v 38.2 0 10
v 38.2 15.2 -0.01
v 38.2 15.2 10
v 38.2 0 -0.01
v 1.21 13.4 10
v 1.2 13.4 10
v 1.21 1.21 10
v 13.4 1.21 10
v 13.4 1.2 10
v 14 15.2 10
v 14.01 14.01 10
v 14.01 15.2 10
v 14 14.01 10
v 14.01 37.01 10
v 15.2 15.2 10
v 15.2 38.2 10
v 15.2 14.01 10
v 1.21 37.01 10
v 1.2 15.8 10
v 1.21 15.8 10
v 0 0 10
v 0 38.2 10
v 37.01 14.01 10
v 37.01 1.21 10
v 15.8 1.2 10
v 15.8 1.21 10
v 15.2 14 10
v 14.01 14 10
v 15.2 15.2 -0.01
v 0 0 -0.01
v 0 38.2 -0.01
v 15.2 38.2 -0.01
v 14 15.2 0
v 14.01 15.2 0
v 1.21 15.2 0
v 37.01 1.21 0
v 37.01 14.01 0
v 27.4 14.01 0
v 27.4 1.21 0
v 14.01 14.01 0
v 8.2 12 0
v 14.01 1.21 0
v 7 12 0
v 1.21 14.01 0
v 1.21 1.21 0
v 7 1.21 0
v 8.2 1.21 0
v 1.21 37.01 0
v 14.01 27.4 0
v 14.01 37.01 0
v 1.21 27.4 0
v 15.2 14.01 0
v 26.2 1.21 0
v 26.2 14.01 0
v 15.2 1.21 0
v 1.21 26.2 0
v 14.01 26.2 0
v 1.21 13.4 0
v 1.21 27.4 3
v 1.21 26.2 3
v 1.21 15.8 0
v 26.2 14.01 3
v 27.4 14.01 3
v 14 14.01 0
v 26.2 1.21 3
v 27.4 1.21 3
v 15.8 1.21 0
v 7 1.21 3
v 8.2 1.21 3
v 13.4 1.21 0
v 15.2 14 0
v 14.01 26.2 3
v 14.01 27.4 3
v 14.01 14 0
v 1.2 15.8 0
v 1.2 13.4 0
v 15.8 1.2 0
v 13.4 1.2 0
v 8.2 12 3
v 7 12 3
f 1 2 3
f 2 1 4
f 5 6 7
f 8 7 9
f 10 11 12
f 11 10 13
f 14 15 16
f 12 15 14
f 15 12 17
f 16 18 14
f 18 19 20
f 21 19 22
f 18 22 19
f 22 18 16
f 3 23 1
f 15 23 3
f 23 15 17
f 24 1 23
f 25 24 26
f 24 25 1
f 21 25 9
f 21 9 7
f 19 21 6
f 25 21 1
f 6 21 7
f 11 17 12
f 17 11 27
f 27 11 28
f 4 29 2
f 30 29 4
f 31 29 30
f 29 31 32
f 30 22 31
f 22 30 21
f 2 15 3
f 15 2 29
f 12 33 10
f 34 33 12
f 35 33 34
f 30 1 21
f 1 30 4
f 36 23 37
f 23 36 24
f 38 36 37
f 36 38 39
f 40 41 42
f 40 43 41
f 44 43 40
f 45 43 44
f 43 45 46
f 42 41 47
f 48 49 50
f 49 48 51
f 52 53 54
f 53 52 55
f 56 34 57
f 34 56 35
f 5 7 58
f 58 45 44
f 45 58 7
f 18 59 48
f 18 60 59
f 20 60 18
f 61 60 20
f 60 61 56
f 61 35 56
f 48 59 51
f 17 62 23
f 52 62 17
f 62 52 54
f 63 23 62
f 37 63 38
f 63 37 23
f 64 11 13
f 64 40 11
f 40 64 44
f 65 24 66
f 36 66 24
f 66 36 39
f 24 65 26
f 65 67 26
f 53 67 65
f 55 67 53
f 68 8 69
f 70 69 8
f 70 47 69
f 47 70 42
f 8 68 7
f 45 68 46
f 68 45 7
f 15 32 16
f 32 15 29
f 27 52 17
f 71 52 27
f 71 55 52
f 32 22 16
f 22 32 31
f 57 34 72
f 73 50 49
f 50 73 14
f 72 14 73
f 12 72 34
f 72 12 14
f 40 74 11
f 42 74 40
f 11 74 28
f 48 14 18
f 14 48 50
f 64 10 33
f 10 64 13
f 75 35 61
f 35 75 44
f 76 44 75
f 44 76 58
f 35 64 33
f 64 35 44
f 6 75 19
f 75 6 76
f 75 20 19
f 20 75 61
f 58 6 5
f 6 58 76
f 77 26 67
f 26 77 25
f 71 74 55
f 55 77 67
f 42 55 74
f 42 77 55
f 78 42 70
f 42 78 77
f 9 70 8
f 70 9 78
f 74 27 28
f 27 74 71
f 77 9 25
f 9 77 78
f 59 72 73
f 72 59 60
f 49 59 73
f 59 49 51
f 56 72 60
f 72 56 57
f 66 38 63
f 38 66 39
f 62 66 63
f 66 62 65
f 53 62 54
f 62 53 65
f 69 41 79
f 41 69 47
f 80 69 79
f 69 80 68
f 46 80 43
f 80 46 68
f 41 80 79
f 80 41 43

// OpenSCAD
// file: ../Base/PlacementOptions.scad
// Fischertechnik Box Foundation
// Placement Options

// Alignment
NoAlign = 0;
AlignLeft = 1;
AlignBottom = 2;
AlignCenter = 3;
AlignRight = 4;
AlignTop = 5;

// Element rotation degree steps
rotations = [0, -90, -180, -270];

// Rotation
NoRotation = 0;
Rotate0 = 0;
Rotate90 = 1;
Rotate180 = 2;
Rotate270 = 3;

// Docking (seen from above)
NoDock = -1;
DockLeft = 0;
DockTop = 1;
DockRight = 2;
DockCorner = 2;
DockBottom = 3;

// Web corners
LowerLeft = 0;
UpperLeft = 1;
UpperRight = 2;
LowerRight = 3;

// Web position relative to corner
LeftOfCorner = 0;
RightOfCorner = 1;
// file: ../Base/Boxes.scad
// Fischertechnik Box Foundation
// Pre-designed Boxes

use <Constants.scad>

include <PlacementOptions.scad>

box190Width = 190;
box190Depth = 130;
box130Width = 130;
box130Depth = 95;

// Values are from an original ec3 box
topBottomDifference = 1.5;
outerHeight = 40;
baseThickness = 1.8;
innerHeight = outerHeight - baseThickness;
stackExcess = 5.7;
radius = 3.5;
wallThickness = 1.5;
tolerance = 0.2;

boxWallThickness = wallThickness;
boxBaseThickness = baseThickness;
boxWebWidth = 3.0;

// getBoxWallThickness()
// Gets the wall thickness of a Fischertechnik Box
function getBoxWallThickness() = boxWallThickness;

// getBoxUsageHeight(height = 38.2)
// Gets the usable height of a Fischertechnik box
// height = Outer height of the box from the bottom to the upper edge.
function getBoxUsageHeight(height = outerHeight) = height - baseThickness - stackExcess;

// getBoxInnerHeight()
// Gets the inner height of a Fischertechnik box, including the stack excess
function getBoxInnerHeight() = innerHeight;

// getBoxBaseThickness()
// Gets the thickness of the Fischertechnik box base.
function getBoxBaseThickness() = boxBaseThickness;

// getBoxWebWidth()
// Gets the width of a box web
function getBoxWebWidth() = boxWebWidth;

// getBox190Space()
// Gets the usable inner space of a Box 190 as an x/y-list
function getBox190Space() = [
    box190Width - 2*getBoxWallThickness() - topBottomDifference, 
    box190Depth - 2*getBoxWallThickness() - topBottomDifference ];

// RoundedCornerPlate(width, depth, height, radius)
// Creates a body plate with rounded corners for a box. Used
// also to create the complete box with the hull module.
// width = Width of the plate
// depth = depth of the plate 
// height = thickness of the plate
// radius = radius of the rounded corner
module RoundedCornerPlate(width, depth, height, radius) {
    translate([radius, radius])
    hull() {
        w = width-2*radius;
        d = depth-2*radius;
        cube([w, d, height]);
        cylinder(height, r=radius, $fn=getFragments());
        translate([w, 0])
            cylinder(height, r=radius, $fn=getFragments());
        translate([w, d])
            cylinder(height, r=radius, $fn=getFragments());
        translate([0, d])
            cylinder(height, r=radius, $fn=getFragments());
    }
}

// BoxBase(width, depth)
// Creates an empty stackable Fischertechnik compatible box
// width = Outer width of the box (190, 130, ...)
// depth = Outer depth of the box (130, 95, ...)

module BoxBase(width, depth, height=outerHeight) {    
    thinPlate = 0.01;

    innerHeight = height - baseThickness;    
    
    module Body(tolerance=tolerance) {
        hull() {
            // Bottom with tolerance to fit into the original boxes when stacked
            translate([-wallThickness+tolerance, -wallThickness+tolerance, -baseThickness])
                RoundedCornerPlate(width-topBottomDifference-2*tolerance, depth-topBottomDifference-2*tolerance, thinPlate, radius);
            
            // Top
            translate([-wallThickness-topBottomDifference/2, -wallThickness-topBottomDifference/2, innerHeight-thinPlate])
                RoundedCornerPlate(width, depth, thinPlate, radius);
         }
    }

    module Cutoff() {
        hull() {
            coWidth = width - 2*wallThickness;
            coDepth = depth - 2*wallThickness;
            
            // Bottom
            RoundedCornerPlate(coWidth-topBottomDifference, coDepth-topBottomDifference, thinPlate, radius);

            // Top
            translate([-topBottomDifference/2, -topBottomDifference/2, innerHeight+thinPlate]) 
                RoundedCornerPlate(coWidth, coDepth, thinPlate, radius);
        }
    }
    
    difference() {        
        Body();
        Cutoff();
        stackOffset = innerHeight - stackExcess;
        translate([0, 0, stackOffset + baseThickness])
            Body(tolerance=0);
    }
}

// Creates the Fischertechnik empty box 130x190 mm and places it at position 0,0
// 190x130 are the outer sizes, the inner space is slightly smaller. Use getBox190Space() to get the inner sizes.
// The box is positioned that the usable inner space is at the 0,0,0 position.

module Box190() {
    BoxBase(box190Width, box190Depth);
}

// Gets the usable inner space of a Box 130 as an x/y-list
function getBox130Space() = [
    box130Width - 2*getBoxWallThickness() - topBottomDifference, 
    box130Depth - 2*getBoxWallThickness() - topBottomDifference ];

// Creates the Fischertechnik empty box 95x130 mm and places it at position 0,0
// 190x130 are the outer sizes, the inner space is slightly smaller. Use getBox190Space() to get the inner sizes.
// The box is positioned that the usable inner space is at the 0,0,0 position.

module Box130() {
    BoxBase(box130Width, box130Depth);
}

// Creates a web at the specified box walls
// corner 0 = LowerLeft, 1 = UpperLeft, 2 = UpperRight, 3 = LowerRight
// side 0 = LeftOfCorner, 1 = RightOfCorner
// distance = Distance in mm from the corner
// boxSpace = inner width and depth of the box (default: Box 190)
// webWidth = length of the web (default is 3 mms)
// webThickness = thickness of the web (default is 1 mm)
// height = Height of the web (standard is getBoxUsageHeight())
// sink = How much of the web is sunk into the wall

module BoxWeb(
    corner, 
    side, 
    distance, 
    boxSpace=getBox190Space(), 
    webWidth=getBoxWebWidth(), 
    webThickness=1.0, 
    height=getBoxUsageHeight(),
    sink = getBoxWallThickness()/2) {
    width = (corner % 2 == 0) ? 
            (side == LeftOfCorner ? webWidth : webThickness) :
            (side == LeftOfCorner ? webThickness : webWidth);

    depth = (corner % 2 == 0) ? 
            (side == RightOfCorner ? webWidth : webThickness) :
            (side == RightOfCorner ? webThickness : webWidth);
    
    xDiff = corner == LowerLeft ? 
                (side == LeftOfCorner ? -sink : distance) :
            (corner == UpperLeft ?                
                (side == LeftOfCorner ? distance : -sink) :
            (corner == UpperRight ?
                (side == LeftOfCorner ? boxSpace.x-webWidth+sink : boxSpace.x-distance-webThickness) :
                (side == LeftOfCorner ? boxSpace.x-distance-webThickness: boxSpace.x-webWidth+sink)));

    yDiff = corner == LowerLeft ? 
                (side == RightOfCorner ? -sink : distance) :
            (corner == UpperLeft ?
                (side == RightOfCorner ? boxSpace.y-distance-webThickness : boxSpace.y-webWidth+sink) :
            (corner == UpperRight ?
                (side == RightOfCorner ? boxSpace.y-webWidth+sink : boxSpace.y-distance-webThickness) :
                (side == RightOfCorner ? distance : -sink)));
    
    translate([xDiff, yDiff, -getExcess()])
        cube([width, depth, height + 2*getExcess()]);
}
// file: ../Base/Rotation.scad
// Fischertechnik Box Foundation
// Geometry Helpers Rotation

include <PlacementOptions.scad>

// getRotatedSpace(space, rotation=NoRotation)
// Rotates the space dependent on the specified rotation

function getRotatedSpace(space, rotation=NoRotation) = [
    (rotation == Rotate90 || rotation == Rotate270) ? space.y : space.x,
    (rotation == Rotate90 || rotation == Rotate270) ? space.x : space.y
];

// Rotates the given space around the fixed left lower corner
// space = the space the children needs as width/depth list [width,depth]
// rotation = 0 Rotate0 degrees, 1 Rotate90 degrees, 2 Rotate180 degrees, 3 Rotate270 degrees (equivalent to -90)

module RotateFix(space, rotation=NoRotation) {
    dy = (rotation == Rotate0 || rotation == Rotate270) ? 0 :
        (rotation == Rotate90) ? space.x :
        space.y;
    dx = (rotation < Rotate180) ? 0 :
        (rotation == Rotate180) ? space.x :
        space.y;
    
    translate([dx, dy, 0])
        rotate([0, 0, rotations[rotation]])
            children();
}
// file: ../Base/Alignment.scad
// Fischertechnik Box Foundation
// Geometry Helpers Alignment

include <PlacementOptions.scad>

// getAlignedX(elementWidth, spaceWidth, align=AlignRight, offset=0)
// Gets the aligned X offset of an element with the given
// width in the given space.
// elementWidth = The width of the element to positon
// spaceWidth = The space where the element should be aligned
// align = 0 AlignLeft, 1 AlignCenter, 2 AlignRight
// offset = an optional offset from the aligned position. When
// aligned left or centered, then positive values are in X direction.
// When aligned right then positive values are in negative X direction.

function getAlignedX(elementWidth, spaceWidth, align=AlignRight, offset=0) =
    (align == AlignLeft) ?
        offset :
        ((align == AlignCenter) ?
        (spaceWidth - elementWidth)/2 + offset :
        spaceWidth - offset - elementWidth);

// getAlignedY(elementDepth, spaceDepth, align=AlignTop, offset=0)
// Gets the aligned Y offset of an element with the given
// depth in the given space.
// elementDepth = The depth of the element to positon
// spaceDepth = The space where the element should be aligned
// align = 0 AlignBottom, 1 AlignCenter, 2 AlignTop
// offset = an optional offset from the aligned position. When
// aligned bottom or centered, then positive values are in Y direction.
// When aligned top then positive values are in negative Y direction.

function getAlignedY(elementDepth, spaceDepth, align=AlignTop, offset=0) =
    (align == AlignBottom) ?
        offset :
        ((align == AlignCenter) ?
        (spaceDepth - elementDepth)/2 + offset :
        spaceDepth - offset - elementDepth);
// file: ../Base/Placement.scad
// Fischertechnik Box Foundation
// Geometry Helpers Placement

use <Constants.scad>
use <Alignment.scad>
use <Rotation.scad>
use <Boxes.scad>

include <PlacementOptions.scad>

// Place(x=0, y=0, elementSpace=[0,0], alignX=AlignLeft, alignY=AlignBottom, rotation=Rotate0, boxSpace=getBox190Space())
// Places the child at the specified position
// y = Y-Position. This is a relative position when an X aligment is specified.
// x = X-Position. This is a relative position when an Y aligment is specified.
// elementSpace = space of the element to be placed [x,y]
// alignX = -1=NoAlign, 0 AlignLeft, 1 AlignCenter, 3 AlignRight (elementSpace and boxSpace required!)
// alignY = -1=NoAlign, 2 AlignBottom, 1 AlignCenter, 4 AlignTop (elementSpace and boxSpace required!)
// rotation = 0 Rotate0 0 degrees, 1 Rotate90 90 degrees, 
// 2 Rotate180 180 degrees, 3 Rotate270 270 degrees (equivalent to -90)
// boxSpace = Inner space of the box where the placement occurs [x,y] - default is Box 190x130 inner space

module Place(x=0, y=0, elementSpace=[0,0], 
  alignX=AlignLeft, alignY=AlignBottom, 
  rotation=NoRotation, boxSpace=getBox190Space()) {

    module Position(x, y, space, rotation=Rotate0) {
        translate([x, y, 0])
            RotateFix(space, rotation)
                children();
    }

    space = getRotatedSpace(elementSpace, rotation);
    alignedX = getAlignedX(space.x, boxSpace.x, alignX, x);
    alignedY = getAlignedY(space.y, boxSpace.y, alignY, y);
    Position(alignedX, alignedY, elementSpace, rotation)
        children();
}

// Center(space=getBox130Space(), elementSpace=[0,0])
// space = Space where the children is centered. For cylinder use centered=true and no elementSpace.
// elementSpace = space of the element to be centered [x,y]

module Center(space=getBox190Space(), elementSpace=[0,0]) {
    Place(elementSpace=elementSpace, boxSpace=space, alignX=AlignCenter, alignY=AlignCenter)
        children();
}

// CenterHorizontal(width=0, y=0, offset=0, space=getBox130Space())
// width = Width of the element to be placed.
// y = Y position of the element
// offset = Offset from the center position (negative will be left of the center)
// space = Space where the element is placed

module CenterHorizontal(width=0, y=0, offset=0, space=getBox190Space()) {
    Place(x=offset, y=y, elementSpace=[width, 0], boxSpace=space, alignX=AlignCenter)
        children(0);
}

// CenterVertical(depth=0, x=0, offset=0, space=getBox130Space())
// depth = Depth of the element to be placed.
// x = X position of the element
// offset = Offset from the center position (negative will be down of the center)
// space = Space where the element is placed

module CenterVertical(depth=0, x=0, offset=0, space=getBox190Space()) {
    Place(x=x, y=offset, elementSpace=[0, depth], boxSpace=space, alignY=AlignCenter)
        children(0);
}

// getIsVertical(align)
// True if the specified alignment needs a vertical orientation for a divider (AlignRight, AlignLeft)

function getIsVertical(align) = (align == AlignRight || align == AlignLeft);

// getIsHorizontal(align)
// True if the specified alignment needs a horizontal orientation for a divider (AlignTop, AlignBottom)

function getIsHorizontal(align) = (align == AlignTop || align == AlignBottom);
// file: ../Base/Constants.scad
// Fischertechnik Box Foundation
// Constants

// Constant values necessary for multiple elements

// Base constants
dividerThickness = 1.2;
excess = 0.01;
fragments = 90;
tolerance = 0.8;

// Gets the thickness of a divider 
function getDividerThickness() = dividerThickness;

// Gets the excess that is used to merge walls into each other
function getExcess() = excess;

// Gets amount of fragments of a cylinder
function getFragments() = fragments;

// Gets the inner tolerance of a frame to each side
function getTolerance() = tolerance;


// Fischertechnik specific constants
axisDiameter = 4;
axisBottomDiameter = axisDiameter + 1;
axisTolerance = 0.2;

// Gets axis diameter of Fischertechnik axis
function getAxisDiameter() = axisDiameter;

// Gets axis diameter tolerance (subtracted for element axis)
function getAxisTolerance() = axisTolerance;

// Gets the axis diameter for standing axis
function getStandAxisDiameter() = getAxisDiameter() - getAxisTolerance();

// Gets axis bottom diameter for thicker part at the bottom
function getAxisBottomDiameter() = axisBottomDiameter;

pinHeight = 2.5;

// gets the height of a connecting pin
function getPinHeight() = pinHeight;

standardEdgeDistance = 2.5;
standardWebDistance = 11.5;
standardCornerLength = 15;

// gets the standard distance to the wall of the box for dockable frames with webs
function getStandardEdgeDistance() = standardEdgeDistance;

// gets the standard distance of each web to the corner of the dockable frame
function getStandardWebDistance() = standardWebDistance;

// gets the standard length of the corner walls of a dockable frame
function getStandardCornerLength() = standardCornerLength;

tubeWallFactor = 0.8;

// gets the wall thickness of a tube.
function getTubeWallThickness() = tubeWallFactor * getDividerThickness();

smallPartsFrameHeight = 20;

// gets the frame height for docked small parts boxes.
function getSmallPartsFrameHeight() = smallPartsFrameHeight;

hubRingDiameter = 19.5;
hubRingLevelDiameter = 21;

// gets the diameter of a tube matching the inner ring of a wheel
function getHubRingDiameter() = hubRingDiameter;

// gets the diameter of a hub tube with a thicker diameter
function getHubRingLevelDiameter() = hubRingLevelDiameter;
// main file
// Fischertechnik Box Library
// Frame for universal joint cardan
// 31044

use <../Base/Constants.scad>
use <../Base/Placement.scad>
use <../ModelBase/Simple.scad>

/* [Hidden] */
width = 35;
depth = 12;
height = 10;

// getFrameUniversalJointCardanSpace()
// Gets the complete space of the universal joint cardan frame

function getFrameUniversalJointCardanSpace() = getAngledFrameOuterVolume(width, depth, width, depth, height);

// FrameUniversalJointCardan()
// Frame for a universal joint cardan (as mot1)

module FrameUniversalJointCardan() {
    AngledFrame(width, depth, width, depth, height);
    
    innerVolume = getFrameInnerVolume([width, depth, height]);
    
    webEndDistance = 12;
    webHeight = 3;
    Place(getDividerThickness() - getExcess(), getFrameUniversalJointCardanSpace().y - webEndDistance)
        Wall([innerVolume.y+2*getExcess(), getDividerThickness(), webHeight]);
    Place(getFrameUniversalJointCardanSpace().y - webEndDistance, getDividerThickness() - getExcess())
        Wall([getDividerThickness(), innerVolume.y+2*getExcess(), webHeight]);
    Place((innerVolume.y + getDividerThickness()) / 2, getDividerThickness() - getExcess())
        Wall([getDividerThickness(), innerVolume.y+getExcess() - 2, webHeight]);
}

// Test
color("lightgray")
FrameUniversalJointCardan();
